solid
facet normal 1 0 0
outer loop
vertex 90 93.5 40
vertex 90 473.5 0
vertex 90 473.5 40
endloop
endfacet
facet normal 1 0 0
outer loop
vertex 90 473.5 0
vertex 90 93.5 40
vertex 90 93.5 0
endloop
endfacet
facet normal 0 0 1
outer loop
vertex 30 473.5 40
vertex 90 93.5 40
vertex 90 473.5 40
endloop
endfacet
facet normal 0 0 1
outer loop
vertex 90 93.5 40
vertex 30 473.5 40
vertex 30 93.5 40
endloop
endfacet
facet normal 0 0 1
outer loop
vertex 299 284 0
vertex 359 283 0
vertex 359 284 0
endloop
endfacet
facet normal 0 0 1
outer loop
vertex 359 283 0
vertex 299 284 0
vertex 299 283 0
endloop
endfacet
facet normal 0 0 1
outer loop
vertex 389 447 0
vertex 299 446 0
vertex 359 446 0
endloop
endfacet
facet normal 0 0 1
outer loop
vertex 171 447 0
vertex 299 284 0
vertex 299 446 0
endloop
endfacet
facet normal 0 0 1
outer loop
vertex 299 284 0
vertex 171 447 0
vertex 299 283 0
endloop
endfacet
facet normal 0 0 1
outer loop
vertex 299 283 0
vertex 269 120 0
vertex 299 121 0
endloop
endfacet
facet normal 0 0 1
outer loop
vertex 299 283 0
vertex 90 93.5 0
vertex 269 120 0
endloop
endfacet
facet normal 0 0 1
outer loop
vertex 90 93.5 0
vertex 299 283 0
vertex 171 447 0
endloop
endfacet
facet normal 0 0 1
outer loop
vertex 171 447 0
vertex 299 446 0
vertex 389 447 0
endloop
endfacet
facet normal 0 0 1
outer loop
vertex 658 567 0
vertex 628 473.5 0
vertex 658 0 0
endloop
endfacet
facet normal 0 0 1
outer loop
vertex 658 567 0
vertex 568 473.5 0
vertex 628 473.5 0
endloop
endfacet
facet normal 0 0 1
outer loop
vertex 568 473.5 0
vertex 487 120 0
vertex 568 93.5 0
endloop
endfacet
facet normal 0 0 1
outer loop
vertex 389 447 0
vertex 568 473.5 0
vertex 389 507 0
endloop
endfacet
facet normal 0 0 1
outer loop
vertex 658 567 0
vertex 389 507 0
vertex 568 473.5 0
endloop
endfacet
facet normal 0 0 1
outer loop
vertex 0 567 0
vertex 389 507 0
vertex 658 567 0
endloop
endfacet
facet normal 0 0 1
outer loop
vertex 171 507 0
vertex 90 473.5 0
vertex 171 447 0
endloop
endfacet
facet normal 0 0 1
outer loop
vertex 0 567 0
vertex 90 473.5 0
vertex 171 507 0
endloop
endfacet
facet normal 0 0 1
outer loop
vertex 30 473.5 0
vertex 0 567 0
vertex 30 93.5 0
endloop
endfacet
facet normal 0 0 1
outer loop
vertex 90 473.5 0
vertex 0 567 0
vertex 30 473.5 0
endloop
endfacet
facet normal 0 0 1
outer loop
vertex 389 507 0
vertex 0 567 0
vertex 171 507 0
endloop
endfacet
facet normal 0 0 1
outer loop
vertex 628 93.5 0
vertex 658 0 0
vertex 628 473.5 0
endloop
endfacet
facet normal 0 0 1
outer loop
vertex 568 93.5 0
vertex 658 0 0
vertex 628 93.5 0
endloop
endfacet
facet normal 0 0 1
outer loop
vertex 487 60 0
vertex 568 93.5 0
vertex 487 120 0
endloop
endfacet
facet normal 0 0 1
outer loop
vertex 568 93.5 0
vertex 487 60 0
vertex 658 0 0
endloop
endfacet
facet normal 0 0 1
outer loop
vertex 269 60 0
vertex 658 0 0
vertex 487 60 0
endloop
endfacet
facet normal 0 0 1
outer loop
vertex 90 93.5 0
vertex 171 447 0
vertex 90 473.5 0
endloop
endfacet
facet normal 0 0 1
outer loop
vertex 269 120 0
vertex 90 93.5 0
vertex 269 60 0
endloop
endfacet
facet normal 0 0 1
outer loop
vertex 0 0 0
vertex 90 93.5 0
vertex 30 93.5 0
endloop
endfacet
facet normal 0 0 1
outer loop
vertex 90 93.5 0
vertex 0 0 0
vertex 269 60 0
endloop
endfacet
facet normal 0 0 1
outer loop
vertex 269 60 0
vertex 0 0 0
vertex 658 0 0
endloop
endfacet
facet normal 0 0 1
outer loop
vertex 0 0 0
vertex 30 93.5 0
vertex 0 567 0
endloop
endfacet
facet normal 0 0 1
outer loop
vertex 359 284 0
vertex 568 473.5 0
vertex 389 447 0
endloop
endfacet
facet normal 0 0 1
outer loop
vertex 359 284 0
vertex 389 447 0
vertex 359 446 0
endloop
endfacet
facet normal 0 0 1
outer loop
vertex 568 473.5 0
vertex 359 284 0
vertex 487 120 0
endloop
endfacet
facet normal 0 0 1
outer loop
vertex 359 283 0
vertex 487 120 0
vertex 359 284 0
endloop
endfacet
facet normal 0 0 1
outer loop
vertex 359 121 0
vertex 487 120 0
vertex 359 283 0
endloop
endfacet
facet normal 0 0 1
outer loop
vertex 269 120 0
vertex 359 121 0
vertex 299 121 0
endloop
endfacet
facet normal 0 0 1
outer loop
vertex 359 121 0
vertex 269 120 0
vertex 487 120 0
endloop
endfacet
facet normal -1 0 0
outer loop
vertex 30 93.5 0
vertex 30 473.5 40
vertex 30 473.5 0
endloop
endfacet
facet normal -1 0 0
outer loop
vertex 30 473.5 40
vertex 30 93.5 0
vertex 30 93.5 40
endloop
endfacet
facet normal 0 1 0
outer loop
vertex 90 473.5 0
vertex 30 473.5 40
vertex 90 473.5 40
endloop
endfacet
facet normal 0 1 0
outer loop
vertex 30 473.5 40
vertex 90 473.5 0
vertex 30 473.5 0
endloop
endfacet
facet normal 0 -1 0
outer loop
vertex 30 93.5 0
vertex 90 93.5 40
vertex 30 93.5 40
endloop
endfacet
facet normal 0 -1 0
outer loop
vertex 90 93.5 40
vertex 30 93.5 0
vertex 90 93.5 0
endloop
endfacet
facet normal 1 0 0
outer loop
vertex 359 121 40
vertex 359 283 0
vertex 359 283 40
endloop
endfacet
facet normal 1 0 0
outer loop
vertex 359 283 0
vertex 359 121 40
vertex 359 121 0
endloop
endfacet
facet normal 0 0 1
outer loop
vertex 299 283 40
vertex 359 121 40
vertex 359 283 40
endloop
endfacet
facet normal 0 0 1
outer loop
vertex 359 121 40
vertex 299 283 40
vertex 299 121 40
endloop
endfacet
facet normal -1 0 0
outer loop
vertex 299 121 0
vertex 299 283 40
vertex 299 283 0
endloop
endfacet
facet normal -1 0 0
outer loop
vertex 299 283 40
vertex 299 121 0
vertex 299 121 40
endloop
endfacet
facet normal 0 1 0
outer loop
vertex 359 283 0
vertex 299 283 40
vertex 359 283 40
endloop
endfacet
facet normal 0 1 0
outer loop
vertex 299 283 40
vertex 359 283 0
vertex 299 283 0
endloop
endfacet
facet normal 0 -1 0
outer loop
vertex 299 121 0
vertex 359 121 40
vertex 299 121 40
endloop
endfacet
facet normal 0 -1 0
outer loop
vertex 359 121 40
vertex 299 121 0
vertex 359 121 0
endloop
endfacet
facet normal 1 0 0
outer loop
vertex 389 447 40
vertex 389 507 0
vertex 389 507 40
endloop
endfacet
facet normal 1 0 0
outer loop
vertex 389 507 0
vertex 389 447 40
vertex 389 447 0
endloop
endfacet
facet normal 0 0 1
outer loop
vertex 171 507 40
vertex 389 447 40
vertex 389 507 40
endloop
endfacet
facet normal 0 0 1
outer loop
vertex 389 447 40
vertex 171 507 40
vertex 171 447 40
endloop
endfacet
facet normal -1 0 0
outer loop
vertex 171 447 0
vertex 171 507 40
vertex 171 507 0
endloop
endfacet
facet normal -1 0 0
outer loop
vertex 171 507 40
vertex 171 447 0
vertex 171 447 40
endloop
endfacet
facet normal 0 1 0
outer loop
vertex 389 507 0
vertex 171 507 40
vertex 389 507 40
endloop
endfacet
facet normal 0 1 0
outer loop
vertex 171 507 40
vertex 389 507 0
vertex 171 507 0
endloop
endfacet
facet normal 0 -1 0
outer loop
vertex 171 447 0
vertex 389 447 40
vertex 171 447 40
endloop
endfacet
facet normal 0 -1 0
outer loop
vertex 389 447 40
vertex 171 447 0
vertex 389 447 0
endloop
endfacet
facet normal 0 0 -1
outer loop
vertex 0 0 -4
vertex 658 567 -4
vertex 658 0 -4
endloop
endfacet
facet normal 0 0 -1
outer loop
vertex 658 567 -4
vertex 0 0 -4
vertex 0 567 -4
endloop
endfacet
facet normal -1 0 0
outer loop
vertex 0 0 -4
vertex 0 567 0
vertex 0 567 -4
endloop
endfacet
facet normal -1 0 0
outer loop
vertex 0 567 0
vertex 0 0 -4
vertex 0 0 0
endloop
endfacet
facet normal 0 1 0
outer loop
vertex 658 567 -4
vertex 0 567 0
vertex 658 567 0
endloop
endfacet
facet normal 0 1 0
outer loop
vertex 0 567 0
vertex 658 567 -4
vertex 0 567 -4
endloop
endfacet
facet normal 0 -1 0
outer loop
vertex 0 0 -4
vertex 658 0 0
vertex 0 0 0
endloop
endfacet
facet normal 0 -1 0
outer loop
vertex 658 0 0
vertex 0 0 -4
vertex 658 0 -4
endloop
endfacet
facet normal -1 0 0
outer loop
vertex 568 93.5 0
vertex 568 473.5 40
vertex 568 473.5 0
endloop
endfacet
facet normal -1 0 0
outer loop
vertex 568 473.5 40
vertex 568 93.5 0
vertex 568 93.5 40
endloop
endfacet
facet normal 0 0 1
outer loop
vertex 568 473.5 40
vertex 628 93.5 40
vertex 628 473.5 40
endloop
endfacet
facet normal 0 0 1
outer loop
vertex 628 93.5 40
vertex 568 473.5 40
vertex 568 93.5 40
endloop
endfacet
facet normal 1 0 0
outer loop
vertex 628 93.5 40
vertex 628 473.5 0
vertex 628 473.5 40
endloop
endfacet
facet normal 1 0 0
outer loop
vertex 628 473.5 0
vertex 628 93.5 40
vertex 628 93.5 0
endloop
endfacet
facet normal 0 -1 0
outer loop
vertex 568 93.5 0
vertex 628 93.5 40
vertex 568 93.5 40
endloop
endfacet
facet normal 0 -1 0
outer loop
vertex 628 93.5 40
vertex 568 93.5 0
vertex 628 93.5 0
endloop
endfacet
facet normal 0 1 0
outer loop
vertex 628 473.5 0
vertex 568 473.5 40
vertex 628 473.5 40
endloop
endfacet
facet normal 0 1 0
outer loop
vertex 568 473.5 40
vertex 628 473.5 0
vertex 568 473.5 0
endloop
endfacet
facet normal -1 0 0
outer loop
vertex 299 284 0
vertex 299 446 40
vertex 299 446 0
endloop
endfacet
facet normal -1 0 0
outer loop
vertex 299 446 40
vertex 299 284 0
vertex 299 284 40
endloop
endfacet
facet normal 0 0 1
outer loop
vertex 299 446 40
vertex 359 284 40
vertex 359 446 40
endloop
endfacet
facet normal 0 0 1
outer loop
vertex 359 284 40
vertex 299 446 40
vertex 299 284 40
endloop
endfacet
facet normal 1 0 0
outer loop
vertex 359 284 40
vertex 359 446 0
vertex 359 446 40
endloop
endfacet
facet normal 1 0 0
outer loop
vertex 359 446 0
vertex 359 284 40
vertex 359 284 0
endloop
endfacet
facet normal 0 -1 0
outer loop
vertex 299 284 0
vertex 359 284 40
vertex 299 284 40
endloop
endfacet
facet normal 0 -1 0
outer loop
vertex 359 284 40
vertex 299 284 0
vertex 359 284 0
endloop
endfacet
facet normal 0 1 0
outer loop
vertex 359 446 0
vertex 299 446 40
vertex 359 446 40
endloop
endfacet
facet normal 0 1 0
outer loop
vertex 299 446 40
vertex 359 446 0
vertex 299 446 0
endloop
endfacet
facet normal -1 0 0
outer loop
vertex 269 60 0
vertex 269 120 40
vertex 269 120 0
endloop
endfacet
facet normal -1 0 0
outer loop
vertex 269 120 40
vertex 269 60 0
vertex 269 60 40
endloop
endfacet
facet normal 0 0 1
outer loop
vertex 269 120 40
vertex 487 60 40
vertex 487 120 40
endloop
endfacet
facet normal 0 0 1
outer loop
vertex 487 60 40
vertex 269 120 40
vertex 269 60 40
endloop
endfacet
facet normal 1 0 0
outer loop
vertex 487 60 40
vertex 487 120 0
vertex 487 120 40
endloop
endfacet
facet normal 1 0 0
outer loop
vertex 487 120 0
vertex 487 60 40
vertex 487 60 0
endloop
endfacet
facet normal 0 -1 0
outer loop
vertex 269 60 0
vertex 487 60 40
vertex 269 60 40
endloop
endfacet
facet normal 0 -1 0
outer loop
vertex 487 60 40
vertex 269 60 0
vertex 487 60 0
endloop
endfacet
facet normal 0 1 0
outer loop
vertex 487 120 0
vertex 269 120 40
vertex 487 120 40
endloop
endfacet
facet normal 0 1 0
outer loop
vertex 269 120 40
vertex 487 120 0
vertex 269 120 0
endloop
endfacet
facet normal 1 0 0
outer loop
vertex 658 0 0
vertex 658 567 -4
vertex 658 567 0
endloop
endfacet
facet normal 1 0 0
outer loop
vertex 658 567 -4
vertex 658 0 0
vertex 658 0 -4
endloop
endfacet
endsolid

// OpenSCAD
// Schweißtisch geschlossen

vkr_h=40;
vkr_l=380;
vkr_b=60;

vkr1_l=162;
vkr2_l=vkr_l-vkr1_l;

p_h=4;
p_l=567;
p_b=329;

clear=1;
dist=0;
module mod() {
    // 1. bar
    color( "Olive", 1.0 ) {
        translate([0.5*vkr_b,(p_l-vkr_l)/2]) {
            cube([vkr_b,vkr_l,vkr_h], 0);
        };
    };

    // 2. bar
   translate([p_b-0.5*vkr_b,2*vkr_b+clear,0]) {
        color( "Lime", 1.0 ) {
            cube([vkr_b,vkr1_l,vkr_h], 0);
        };
    };

    // 3. bar
    translate([p_b-vkr2_l+vkr_b,p_l-2*vkr_b,0]) {
        color( "ForestGreen", 1.0 ) {
            cube([vkr2_l,vkr_b,vkr_h], 0);
        };
    };

    // 4. bar
    translate([1.5*vkr_b,vkr_b,0]) {
        color( "Red", 1.0 ) {
            //cube([vkr_l/2,vkr_b,vkr_h], 0);
        };
    };

    // Plate
    translate([0,0,-p_h]) {
        cube([p_b,p_l,p_h], 0);
    };
};


mod();

translate([p_b*2+dist,p_l,0]) {
    rotate(a=180, v=[0,0,1]){
        mod();
    };
};
